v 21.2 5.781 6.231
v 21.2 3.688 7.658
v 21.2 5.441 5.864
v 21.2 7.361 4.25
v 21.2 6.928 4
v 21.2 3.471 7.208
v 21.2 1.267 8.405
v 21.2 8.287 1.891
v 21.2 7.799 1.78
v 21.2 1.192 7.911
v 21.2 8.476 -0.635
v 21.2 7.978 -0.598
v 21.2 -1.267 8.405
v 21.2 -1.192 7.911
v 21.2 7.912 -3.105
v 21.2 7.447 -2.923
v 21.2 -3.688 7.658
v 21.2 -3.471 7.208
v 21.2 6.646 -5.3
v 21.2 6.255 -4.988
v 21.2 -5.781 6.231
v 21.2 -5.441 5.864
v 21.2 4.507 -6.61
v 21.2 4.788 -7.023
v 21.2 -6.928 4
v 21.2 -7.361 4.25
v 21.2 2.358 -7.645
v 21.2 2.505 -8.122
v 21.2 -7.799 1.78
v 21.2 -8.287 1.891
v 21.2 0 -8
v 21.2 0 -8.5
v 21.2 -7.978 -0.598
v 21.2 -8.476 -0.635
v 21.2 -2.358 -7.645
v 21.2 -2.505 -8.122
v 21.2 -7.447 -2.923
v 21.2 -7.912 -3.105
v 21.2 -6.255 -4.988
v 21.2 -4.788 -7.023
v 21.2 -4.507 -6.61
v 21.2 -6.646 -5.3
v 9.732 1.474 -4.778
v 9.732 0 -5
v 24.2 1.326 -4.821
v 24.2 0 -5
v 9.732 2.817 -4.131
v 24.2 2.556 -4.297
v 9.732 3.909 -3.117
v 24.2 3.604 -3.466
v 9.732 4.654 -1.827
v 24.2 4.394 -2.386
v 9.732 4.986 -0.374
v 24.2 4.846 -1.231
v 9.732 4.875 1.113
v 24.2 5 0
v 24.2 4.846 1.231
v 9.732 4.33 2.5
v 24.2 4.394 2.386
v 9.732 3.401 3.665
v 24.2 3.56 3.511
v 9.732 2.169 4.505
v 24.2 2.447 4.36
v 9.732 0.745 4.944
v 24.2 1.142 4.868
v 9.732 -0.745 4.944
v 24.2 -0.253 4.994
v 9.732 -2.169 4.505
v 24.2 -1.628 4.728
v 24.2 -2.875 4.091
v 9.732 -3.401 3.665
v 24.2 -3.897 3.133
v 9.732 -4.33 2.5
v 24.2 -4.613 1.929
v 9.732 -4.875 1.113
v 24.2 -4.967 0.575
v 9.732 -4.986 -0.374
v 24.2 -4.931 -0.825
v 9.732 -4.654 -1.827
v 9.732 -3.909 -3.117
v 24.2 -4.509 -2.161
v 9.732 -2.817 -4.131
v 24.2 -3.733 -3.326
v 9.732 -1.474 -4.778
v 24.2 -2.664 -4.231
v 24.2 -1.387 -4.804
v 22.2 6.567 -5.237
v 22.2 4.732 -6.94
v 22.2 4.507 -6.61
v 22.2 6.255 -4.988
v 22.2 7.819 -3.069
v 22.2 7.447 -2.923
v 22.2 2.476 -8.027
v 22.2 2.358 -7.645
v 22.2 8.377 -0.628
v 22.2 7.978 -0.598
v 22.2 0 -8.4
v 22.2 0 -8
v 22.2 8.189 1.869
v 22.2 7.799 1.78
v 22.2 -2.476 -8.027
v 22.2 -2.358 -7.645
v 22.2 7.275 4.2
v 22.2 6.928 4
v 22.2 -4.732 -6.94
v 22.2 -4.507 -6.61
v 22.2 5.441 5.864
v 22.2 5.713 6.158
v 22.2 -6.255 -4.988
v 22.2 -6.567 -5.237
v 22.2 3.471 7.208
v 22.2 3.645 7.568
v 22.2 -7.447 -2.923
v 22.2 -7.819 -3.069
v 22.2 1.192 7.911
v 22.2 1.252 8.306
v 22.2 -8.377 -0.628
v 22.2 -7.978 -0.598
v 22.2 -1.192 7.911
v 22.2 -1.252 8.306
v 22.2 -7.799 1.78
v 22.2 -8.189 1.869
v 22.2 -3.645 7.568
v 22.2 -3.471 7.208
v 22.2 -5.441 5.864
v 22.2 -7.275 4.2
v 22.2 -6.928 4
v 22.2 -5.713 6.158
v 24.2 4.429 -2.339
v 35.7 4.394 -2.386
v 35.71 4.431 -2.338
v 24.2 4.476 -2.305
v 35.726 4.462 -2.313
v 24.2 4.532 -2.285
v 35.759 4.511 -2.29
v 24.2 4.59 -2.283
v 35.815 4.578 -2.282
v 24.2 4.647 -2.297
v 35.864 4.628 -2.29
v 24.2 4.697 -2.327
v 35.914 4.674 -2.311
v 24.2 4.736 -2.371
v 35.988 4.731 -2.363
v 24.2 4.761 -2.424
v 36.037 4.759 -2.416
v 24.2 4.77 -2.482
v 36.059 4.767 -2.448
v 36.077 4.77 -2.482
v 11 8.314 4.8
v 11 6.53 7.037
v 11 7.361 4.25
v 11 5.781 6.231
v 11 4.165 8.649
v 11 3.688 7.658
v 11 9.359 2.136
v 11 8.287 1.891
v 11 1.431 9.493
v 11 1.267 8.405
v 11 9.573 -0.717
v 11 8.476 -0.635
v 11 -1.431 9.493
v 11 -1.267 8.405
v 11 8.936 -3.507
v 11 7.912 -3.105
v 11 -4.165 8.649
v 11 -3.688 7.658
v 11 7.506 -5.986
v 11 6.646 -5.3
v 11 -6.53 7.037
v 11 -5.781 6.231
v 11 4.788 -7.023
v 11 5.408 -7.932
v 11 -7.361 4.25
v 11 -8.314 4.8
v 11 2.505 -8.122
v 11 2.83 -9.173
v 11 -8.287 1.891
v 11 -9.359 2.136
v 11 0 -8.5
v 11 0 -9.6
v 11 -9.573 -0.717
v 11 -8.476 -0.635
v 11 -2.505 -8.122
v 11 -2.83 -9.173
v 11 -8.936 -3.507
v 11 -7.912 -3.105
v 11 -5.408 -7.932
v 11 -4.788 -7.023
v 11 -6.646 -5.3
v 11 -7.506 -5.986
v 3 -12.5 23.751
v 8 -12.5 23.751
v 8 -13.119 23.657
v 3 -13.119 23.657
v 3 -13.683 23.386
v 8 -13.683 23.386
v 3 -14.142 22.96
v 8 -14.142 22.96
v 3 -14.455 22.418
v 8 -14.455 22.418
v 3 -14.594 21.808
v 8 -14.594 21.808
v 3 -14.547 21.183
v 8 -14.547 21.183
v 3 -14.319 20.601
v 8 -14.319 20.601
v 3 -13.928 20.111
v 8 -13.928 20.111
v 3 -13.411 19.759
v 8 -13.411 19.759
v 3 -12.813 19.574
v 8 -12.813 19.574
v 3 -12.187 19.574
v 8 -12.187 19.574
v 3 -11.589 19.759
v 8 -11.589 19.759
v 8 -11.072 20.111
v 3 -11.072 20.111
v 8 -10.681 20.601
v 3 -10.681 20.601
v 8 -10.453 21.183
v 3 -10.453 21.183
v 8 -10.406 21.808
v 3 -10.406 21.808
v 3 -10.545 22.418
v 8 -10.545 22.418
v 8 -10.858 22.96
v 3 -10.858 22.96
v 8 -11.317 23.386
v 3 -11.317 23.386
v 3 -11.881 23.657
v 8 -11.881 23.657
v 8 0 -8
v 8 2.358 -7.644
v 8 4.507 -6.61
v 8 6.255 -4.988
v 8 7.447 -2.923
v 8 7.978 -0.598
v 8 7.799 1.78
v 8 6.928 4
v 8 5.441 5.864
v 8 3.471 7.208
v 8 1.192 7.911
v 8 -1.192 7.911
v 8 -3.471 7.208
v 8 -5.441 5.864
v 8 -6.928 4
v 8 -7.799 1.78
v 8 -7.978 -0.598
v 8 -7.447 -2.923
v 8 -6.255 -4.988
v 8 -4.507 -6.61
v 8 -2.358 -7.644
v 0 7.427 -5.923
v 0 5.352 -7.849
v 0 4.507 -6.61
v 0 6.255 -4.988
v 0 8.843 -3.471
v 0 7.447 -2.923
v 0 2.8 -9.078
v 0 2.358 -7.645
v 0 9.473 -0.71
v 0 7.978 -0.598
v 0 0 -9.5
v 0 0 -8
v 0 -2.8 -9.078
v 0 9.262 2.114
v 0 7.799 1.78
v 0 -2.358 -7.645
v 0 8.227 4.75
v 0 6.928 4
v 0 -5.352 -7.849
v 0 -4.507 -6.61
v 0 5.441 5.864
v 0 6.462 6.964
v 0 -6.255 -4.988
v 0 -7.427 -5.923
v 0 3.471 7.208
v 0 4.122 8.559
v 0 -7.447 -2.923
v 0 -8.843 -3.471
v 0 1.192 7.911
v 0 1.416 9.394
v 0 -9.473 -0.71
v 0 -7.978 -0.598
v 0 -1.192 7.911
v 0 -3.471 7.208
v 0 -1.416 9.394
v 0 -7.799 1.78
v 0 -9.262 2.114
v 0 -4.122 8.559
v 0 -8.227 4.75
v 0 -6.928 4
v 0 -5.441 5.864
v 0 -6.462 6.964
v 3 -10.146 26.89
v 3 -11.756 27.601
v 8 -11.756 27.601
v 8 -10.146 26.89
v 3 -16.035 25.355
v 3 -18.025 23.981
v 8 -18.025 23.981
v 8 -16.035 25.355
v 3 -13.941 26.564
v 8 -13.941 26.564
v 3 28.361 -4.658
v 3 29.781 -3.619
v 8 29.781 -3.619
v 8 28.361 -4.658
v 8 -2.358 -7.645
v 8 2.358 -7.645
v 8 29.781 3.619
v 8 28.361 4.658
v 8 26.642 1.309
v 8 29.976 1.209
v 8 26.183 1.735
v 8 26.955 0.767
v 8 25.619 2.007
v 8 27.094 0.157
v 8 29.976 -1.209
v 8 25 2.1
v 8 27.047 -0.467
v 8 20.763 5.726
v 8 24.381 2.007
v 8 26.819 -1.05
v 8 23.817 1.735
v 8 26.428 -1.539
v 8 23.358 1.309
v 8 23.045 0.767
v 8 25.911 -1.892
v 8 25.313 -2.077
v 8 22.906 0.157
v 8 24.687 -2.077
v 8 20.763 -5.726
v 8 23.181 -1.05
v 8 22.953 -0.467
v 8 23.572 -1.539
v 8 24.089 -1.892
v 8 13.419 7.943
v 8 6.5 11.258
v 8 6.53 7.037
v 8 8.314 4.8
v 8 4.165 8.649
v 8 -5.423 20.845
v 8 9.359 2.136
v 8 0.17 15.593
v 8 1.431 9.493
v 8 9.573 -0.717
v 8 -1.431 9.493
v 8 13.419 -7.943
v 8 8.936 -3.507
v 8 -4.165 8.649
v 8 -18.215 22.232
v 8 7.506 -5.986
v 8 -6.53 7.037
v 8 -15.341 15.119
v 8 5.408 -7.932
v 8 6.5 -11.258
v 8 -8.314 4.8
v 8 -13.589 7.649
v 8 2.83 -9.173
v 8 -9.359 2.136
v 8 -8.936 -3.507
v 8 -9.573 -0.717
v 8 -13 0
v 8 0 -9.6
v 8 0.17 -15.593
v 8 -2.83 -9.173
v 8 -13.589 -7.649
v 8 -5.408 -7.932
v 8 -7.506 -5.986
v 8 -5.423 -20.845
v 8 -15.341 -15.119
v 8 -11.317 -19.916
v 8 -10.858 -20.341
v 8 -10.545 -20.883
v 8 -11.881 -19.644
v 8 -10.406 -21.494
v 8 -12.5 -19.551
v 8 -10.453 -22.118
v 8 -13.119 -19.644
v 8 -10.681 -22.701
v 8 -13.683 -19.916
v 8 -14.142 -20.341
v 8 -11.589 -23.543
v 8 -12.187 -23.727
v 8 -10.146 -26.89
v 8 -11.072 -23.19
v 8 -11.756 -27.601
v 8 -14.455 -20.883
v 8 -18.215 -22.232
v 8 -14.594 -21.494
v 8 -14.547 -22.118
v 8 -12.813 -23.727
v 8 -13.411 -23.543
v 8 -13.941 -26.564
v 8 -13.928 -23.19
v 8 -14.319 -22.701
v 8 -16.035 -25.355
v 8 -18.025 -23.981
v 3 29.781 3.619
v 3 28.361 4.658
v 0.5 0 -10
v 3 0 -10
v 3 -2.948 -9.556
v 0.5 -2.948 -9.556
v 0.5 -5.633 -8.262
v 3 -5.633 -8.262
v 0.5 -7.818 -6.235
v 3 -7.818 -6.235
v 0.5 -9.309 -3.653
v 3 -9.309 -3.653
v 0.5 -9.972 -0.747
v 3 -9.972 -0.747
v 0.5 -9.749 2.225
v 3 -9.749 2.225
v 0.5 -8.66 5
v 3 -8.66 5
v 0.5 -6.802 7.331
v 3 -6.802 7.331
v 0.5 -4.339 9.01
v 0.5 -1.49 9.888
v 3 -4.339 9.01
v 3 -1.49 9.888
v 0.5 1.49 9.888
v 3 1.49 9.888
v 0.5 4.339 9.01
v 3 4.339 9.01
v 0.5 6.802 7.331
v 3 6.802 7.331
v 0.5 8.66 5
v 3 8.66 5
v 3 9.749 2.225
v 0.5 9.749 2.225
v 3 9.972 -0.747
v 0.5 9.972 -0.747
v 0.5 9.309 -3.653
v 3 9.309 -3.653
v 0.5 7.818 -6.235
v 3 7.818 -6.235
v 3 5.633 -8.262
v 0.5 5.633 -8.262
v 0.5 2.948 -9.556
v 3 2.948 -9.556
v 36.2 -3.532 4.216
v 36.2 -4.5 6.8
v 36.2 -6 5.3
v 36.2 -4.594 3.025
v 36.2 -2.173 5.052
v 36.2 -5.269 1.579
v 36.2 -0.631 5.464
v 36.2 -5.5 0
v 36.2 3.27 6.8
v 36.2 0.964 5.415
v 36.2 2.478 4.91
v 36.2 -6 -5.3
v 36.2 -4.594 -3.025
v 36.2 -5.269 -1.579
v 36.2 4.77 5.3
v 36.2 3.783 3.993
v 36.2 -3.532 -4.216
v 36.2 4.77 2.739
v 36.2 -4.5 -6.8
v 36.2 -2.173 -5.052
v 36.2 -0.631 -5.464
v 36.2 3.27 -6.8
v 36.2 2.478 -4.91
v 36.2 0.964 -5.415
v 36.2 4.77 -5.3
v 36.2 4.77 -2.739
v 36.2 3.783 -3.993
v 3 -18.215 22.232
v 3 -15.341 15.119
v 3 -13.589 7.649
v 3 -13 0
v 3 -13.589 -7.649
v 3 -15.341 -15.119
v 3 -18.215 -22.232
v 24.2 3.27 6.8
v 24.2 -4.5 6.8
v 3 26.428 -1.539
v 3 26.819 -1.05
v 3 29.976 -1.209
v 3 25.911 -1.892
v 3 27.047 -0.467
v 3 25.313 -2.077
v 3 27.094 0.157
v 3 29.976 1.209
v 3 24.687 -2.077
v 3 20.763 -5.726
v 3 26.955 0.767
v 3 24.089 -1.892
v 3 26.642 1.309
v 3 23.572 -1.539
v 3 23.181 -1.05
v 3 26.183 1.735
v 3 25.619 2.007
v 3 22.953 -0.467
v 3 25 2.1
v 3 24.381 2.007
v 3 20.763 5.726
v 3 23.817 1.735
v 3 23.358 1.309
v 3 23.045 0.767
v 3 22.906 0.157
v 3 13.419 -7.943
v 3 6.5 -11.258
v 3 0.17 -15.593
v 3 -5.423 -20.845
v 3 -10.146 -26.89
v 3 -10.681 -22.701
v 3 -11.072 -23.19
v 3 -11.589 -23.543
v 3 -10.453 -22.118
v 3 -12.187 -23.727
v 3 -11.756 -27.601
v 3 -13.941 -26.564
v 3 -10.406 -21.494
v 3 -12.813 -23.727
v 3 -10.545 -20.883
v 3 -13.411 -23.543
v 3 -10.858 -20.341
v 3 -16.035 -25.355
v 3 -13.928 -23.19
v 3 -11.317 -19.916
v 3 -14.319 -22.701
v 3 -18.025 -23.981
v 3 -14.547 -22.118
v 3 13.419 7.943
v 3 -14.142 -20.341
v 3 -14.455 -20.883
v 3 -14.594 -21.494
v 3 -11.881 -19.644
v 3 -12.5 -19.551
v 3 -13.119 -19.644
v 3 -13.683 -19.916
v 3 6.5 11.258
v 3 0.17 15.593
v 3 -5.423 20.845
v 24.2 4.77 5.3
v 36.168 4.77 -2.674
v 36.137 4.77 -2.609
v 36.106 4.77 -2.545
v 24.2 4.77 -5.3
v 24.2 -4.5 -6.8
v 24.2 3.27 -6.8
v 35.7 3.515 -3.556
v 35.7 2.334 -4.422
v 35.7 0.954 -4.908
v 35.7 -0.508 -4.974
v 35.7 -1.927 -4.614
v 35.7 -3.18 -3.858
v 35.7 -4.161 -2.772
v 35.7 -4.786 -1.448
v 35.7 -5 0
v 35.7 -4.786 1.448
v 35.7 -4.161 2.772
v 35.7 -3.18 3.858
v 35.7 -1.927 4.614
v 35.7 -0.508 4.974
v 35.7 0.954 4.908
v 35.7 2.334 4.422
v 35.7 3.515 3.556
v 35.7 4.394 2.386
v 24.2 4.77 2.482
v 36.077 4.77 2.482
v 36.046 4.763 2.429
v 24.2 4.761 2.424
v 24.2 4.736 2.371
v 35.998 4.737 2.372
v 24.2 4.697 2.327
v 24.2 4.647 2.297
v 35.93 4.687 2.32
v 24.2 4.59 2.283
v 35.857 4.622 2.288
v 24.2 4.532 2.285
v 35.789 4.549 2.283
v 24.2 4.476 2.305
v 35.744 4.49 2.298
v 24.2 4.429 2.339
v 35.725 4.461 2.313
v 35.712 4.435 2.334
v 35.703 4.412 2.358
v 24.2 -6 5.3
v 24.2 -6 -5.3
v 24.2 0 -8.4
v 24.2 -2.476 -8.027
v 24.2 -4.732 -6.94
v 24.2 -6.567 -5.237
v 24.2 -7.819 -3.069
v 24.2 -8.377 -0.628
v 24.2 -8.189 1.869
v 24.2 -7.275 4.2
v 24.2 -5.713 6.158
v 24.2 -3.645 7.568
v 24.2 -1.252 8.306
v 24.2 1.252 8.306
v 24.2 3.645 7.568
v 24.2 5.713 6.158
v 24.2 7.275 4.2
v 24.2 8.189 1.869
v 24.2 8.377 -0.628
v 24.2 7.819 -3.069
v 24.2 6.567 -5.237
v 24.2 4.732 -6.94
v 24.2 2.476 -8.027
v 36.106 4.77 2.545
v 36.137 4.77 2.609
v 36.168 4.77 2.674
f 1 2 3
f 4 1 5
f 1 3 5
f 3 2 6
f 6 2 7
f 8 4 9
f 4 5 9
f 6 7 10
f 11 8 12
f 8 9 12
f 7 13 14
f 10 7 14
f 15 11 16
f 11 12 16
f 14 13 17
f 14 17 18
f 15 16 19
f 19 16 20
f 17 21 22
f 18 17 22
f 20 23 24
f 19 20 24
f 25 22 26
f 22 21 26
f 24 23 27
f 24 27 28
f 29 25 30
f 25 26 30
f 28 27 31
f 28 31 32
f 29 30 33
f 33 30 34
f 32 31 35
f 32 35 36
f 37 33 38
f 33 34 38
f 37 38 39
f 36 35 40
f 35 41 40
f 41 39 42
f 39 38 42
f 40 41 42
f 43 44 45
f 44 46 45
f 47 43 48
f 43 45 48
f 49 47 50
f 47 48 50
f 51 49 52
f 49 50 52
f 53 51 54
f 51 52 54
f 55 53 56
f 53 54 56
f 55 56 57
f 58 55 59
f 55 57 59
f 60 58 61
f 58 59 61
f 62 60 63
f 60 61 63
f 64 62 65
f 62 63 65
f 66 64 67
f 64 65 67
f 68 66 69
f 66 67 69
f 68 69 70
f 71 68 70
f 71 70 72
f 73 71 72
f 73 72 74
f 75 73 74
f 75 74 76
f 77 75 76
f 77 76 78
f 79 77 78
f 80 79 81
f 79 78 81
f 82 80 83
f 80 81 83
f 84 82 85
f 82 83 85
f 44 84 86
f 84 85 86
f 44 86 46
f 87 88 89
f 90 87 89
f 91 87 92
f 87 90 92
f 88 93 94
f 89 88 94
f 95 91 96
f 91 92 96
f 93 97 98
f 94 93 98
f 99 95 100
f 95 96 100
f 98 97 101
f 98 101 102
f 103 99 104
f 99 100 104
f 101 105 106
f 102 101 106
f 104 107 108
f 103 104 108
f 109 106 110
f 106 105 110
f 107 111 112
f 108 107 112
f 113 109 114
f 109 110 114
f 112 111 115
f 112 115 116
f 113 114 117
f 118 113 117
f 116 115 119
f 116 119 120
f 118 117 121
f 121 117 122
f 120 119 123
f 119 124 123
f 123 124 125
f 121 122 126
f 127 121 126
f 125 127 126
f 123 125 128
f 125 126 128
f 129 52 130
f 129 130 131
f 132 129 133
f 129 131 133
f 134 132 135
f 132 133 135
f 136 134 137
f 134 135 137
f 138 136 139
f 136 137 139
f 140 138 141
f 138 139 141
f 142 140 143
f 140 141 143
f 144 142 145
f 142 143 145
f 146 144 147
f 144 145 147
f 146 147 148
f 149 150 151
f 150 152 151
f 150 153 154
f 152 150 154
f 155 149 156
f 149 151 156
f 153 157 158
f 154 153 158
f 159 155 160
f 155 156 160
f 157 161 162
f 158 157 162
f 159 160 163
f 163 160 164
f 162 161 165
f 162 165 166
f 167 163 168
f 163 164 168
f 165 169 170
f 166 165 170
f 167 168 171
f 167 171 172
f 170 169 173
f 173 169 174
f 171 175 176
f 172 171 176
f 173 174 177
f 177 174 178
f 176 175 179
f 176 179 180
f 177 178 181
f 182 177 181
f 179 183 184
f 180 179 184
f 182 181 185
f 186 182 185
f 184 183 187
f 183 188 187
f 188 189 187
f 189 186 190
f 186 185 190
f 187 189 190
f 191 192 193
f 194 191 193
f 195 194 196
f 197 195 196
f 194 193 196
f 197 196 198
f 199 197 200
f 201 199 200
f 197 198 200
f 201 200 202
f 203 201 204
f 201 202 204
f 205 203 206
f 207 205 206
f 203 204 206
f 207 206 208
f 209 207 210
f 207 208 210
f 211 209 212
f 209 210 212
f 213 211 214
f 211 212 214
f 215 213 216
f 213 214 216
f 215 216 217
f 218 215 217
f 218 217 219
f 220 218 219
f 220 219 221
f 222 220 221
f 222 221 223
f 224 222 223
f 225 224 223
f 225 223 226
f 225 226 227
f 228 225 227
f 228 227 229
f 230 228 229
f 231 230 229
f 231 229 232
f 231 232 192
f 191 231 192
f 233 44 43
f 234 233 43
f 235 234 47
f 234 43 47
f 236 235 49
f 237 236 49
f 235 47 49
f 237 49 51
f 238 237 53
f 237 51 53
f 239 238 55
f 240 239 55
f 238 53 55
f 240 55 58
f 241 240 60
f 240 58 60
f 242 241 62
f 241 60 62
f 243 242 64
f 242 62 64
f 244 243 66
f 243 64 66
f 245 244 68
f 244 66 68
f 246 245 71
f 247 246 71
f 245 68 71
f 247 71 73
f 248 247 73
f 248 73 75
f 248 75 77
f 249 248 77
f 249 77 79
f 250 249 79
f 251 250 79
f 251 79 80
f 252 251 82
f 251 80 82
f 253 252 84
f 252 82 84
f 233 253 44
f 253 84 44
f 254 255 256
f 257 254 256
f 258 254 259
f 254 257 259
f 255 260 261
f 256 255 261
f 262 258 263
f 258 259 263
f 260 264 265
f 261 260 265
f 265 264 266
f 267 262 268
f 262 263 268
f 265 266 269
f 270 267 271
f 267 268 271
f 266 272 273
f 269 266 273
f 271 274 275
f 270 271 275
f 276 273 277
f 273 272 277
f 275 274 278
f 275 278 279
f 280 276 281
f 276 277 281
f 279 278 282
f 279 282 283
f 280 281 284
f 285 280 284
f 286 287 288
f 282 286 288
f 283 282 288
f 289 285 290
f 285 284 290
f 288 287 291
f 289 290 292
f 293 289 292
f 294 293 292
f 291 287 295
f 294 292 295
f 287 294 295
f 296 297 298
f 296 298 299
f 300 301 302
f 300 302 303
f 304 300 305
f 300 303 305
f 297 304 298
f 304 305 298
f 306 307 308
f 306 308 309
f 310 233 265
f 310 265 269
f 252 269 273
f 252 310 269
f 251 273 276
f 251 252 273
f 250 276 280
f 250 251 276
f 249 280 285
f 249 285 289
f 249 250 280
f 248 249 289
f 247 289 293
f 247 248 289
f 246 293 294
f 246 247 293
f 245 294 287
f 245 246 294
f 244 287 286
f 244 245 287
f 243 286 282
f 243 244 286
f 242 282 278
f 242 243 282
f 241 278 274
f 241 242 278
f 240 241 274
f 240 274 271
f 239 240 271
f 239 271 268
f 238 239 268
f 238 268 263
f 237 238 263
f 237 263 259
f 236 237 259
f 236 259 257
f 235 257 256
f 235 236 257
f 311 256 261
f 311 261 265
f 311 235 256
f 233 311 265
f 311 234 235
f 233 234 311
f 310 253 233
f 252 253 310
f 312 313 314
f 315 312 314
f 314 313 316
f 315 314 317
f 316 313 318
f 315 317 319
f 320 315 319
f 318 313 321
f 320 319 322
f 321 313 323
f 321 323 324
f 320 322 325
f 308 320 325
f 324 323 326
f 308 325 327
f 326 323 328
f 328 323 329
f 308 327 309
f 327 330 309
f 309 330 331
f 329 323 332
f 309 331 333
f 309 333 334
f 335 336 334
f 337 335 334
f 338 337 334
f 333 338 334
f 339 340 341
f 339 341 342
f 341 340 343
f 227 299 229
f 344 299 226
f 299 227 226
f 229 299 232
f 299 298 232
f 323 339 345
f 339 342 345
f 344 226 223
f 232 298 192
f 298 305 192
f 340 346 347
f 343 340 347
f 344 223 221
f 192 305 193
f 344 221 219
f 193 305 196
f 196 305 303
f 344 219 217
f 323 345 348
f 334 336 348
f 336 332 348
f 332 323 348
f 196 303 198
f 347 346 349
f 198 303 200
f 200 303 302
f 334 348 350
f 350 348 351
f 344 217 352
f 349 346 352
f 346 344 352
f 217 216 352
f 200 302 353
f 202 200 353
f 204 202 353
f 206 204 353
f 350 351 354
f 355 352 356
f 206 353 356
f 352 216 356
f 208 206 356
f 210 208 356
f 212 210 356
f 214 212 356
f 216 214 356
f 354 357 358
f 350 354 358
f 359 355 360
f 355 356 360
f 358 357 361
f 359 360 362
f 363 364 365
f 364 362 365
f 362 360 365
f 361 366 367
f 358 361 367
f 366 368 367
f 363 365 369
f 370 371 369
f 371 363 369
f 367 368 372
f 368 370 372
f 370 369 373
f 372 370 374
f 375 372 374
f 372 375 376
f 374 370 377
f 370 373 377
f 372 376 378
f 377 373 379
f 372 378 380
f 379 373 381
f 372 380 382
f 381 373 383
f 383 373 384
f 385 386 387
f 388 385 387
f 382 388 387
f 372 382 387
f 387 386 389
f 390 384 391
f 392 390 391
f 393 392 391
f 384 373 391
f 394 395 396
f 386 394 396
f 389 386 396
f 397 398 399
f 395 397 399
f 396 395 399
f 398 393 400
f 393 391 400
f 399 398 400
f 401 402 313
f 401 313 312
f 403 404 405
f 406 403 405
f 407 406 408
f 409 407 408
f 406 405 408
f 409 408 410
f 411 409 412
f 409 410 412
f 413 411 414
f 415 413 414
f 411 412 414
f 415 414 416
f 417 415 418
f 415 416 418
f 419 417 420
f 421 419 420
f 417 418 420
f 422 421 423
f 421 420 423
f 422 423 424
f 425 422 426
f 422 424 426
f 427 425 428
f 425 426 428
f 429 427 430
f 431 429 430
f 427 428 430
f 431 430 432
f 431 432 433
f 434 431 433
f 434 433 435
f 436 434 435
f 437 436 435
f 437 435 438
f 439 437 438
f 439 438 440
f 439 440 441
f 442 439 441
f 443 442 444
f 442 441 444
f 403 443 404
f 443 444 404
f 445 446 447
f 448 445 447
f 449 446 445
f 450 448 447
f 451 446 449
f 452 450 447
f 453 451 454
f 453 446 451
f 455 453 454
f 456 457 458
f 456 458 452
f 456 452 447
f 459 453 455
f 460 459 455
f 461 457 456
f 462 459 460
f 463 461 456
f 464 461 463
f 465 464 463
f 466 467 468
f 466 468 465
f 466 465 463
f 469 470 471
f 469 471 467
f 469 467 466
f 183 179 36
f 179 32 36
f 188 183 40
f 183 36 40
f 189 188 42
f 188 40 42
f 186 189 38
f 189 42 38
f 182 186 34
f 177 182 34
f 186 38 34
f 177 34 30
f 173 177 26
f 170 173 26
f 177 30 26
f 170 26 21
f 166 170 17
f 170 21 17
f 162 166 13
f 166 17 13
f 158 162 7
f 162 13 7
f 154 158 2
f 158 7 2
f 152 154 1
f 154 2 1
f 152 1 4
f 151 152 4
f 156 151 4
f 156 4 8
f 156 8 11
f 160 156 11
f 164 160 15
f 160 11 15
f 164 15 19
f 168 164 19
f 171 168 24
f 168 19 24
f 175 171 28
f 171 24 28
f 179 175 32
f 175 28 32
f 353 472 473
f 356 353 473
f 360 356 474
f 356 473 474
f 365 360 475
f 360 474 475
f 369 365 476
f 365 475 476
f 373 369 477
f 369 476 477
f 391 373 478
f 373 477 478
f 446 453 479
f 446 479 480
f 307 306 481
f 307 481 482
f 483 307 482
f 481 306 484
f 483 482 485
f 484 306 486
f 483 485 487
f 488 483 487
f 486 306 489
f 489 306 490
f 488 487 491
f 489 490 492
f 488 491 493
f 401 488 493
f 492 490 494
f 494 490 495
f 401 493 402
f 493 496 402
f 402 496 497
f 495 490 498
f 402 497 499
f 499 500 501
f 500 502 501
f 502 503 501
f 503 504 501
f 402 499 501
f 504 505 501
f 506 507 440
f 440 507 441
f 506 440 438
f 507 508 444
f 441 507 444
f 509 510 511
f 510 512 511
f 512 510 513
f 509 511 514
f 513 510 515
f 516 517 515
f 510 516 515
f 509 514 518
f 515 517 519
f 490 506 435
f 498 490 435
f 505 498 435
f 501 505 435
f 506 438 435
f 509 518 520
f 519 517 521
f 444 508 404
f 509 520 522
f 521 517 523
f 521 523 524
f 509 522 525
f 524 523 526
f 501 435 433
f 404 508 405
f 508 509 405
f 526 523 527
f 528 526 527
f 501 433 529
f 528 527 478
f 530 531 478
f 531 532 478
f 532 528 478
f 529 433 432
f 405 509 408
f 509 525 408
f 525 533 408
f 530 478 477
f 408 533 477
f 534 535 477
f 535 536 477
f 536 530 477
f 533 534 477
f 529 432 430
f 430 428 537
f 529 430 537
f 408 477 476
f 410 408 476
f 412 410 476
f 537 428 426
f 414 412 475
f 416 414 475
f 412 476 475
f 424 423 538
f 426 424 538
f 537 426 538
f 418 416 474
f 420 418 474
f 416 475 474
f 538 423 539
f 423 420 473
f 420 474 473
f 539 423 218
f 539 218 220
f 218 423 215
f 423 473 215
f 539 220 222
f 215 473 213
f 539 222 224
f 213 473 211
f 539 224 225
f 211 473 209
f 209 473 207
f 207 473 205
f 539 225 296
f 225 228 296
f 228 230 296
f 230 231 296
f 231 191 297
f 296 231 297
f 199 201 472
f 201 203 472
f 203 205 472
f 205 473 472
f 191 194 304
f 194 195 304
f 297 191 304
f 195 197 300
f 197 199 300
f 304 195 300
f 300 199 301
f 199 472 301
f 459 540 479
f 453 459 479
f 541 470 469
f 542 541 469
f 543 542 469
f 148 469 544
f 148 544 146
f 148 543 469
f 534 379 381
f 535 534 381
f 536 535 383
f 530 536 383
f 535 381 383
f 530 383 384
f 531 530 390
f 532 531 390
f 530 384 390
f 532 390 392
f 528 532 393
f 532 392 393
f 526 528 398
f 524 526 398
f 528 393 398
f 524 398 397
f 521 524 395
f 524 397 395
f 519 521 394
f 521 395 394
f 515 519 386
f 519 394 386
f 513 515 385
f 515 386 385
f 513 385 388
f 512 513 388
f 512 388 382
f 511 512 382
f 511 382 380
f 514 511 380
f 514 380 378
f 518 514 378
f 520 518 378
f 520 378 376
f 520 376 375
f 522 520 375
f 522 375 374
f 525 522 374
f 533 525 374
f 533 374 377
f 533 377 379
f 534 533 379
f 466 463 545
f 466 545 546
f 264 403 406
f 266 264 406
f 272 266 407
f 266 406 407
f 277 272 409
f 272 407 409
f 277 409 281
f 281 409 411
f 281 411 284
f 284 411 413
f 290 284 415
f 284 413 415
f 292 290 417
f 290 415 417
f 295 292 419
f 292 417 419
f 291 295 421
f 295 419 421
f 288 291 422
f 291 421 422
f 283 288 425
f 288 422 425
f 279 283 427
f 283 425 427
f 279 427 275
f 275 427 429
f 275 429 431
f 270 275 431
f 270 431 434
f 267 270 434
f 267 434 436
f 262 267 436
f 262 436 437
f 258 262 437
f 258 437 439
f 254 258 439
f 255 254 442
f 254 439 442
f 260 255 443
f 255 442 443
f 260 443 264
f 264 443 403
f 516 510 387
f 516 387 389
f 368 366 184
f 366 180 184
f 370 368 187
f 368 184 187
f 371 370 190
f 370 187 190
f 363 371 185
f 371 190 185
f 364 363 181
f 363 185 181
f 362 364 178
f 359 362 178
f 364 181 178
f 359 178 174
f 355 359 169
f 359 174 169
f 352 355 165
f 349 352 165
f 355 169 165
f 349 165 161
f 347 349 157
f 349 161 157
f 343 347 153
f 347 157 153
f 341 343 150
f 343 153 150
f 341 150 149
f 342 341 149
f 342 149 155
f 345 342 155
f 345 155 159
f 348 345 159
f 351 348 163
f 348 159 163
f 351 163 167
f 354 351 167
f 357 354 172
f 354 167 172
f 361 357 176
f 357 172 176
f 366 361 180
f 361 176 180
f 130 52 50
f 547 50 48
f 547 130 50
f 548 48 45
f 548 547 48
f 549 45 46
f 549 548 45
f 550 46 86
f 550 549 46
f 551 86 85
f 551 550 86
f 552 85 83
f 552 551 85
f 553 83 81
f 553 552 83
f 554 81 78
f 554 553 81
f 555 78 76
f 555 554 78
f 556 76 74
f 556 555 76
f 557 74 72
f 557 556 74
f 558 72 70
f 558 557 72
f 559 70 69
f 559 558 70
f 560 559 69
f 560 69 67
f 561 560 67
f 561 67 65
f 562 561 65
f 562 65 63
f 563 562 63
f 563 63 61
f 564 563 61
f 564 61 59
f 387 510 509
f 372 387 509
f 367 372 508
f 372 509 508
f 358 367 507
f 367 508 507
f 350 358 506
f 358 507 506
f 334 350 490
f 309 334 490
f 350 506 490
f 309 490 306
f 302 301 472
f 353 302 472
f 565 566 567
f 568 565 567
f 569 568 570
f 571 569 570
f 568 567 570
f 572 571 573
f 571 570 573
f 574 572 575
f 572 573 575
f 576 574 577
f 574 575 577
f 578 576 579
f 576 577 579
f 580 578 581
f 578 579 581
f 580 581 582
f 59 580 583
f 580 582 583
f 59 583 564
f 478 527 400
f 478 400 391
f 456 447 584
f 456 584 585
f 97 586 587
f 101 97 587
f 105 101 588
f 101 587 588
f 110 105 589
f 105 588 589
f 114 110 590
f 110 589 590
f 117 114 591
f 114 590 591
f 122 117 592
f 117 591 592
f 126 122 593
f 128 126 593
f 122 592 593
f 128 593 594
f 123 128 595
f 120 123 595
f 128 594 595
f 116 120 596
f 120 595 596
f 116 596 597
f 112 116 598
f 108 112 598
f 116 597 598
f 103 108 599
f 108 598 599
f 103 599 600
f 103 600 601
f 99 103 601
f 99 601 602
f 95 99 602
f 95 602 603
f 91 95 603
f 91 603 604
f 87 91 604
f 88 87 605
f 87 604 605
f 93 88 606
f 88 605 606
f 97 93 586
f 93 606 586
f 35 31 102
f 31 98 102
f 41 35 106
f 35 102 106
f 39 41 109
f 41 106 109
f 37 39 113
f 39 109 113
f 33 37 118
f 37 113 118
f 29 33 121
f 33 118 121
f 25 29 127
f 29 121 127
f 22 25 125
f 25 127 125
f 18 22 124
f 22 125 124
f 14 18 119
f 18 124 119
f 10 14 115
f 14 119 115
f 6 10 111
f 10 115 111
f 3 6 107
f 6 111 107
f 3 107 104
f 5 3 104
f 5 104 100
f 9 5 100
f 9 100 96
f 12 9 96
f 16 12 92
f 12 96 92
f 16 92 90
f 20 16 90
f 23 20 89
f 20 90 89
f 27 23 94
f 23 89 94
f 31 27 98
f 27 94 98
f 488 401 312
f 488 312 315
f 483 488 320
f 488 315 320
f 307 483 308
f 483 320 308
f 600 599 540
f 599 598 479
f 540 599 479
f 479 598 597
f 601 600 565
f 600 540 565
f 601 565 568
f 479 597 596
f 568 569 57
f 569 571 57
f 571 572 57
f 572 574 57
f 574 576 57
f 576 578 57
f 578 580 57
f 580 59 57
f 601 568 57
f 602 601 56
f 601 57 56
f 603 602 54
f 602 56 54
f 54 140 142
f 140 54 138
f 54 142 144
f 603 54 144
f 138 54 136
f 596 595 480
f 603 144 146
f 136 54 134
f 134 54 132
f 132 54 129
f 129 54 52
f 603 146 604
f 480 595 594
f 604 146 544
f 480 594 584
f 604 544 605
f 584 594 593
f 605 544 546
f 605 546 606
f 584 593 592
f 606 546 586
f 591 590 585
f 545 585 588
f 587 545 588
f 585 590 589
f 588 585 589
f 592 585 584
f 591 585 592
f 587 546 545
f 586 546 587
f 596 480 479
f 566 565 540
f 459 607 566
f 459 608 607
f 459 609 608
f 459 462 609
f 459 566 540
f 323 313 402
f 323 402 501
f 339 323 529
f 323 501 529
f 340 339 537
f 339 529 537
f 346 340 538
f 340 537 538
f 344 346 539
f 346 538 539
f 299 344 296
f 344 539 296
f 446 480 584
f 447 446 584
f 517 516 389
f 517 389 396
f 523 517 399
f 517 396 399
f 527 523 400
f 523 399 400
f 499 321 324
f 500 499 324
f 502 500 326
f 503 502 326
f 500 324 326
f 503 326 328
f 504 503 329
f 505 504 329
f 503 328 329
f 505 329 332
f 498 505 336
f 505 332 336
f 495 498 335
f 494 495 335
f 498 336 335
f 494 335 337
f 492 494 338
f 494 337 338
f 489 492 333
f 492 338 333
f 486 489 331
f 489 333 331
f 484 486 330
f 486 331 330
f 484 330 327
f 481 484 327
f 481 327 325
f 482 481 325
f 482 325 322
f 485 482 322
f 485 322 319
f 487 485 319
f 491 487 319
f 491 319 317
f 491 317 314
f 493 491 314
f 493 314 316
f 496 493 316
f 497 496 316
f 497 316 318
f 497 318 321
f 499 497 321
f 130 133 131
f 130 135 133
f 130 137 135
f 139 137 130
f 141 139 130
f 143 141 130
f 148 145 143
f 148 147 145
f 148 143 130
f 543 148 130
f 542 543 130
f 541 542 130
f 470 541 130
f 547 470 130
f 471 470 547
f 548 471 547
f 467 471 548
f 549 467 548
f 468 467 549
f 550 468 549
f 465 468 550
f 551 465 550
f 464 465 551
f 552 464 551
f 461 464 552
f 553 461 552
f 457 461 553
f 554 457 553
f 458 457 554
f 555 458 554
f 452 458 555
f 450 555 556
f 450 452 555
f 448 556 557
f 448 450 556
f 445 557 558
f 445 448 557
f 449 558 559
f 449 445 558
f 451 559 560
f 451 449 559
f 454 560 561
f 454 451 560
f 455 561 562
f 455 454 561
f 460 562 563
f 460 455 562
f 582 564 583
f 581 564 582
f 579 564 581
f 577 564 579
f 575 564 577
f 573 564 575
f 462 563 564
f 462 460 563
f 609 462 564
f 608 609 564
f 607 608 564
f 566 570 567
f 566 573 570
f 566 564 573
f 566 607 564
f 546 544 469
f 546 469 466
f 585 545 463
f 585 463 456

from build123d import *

# Parameters (mm, degrees)
SKETCH_2_R               = 5
CUT_EXTRUDE_1_DEPTH      = 49.84301383
CUT_EXTRUDE_START        = -8
SKETCH_3_R               = 8
CUT_EXTRUDE_2_DEPTH      = 8
CHAMFER_1_SIZE2          = 1.732050808
CHAMFER_1_SIZE           = 3
HOLE_WIZARD_M5_1_D       = 4.2
CUT_EXTRUDE_3_DEPTH      = 48.428261617
PATTERN_CIRCULAR_1_COUNT = 3
CHAMFER_4_SIZE           = 0.5
EXTRUDE_START            = 12
EXTRUDE_1_DEPTH          = 12
CHAMFER_5_SIZE           = 1.5
CHAMFER_6_SIZE           = 0.5
FILLET_1_R               = 0.2


# Some blends are built 0.0001 mm under size
with BuildPart() as part:
    # 草图1 → 旋转1 (revolve)
    with BuildSketch(Plane.XY, mode=Mode.PRIVATE) as revolve_1_sk:
        Polygon((0, 0), (0, 10), (3, 10), (3, 30), (8, 30), (8, 9.6), (11, 9.6), (11, 8.5), (21.2, 8.5), (21.2, 8), (22.2, 8), (22.2, 8.4), (24.2, 8.4), (24.2, 0), align=None)
    revolve(revolve_1_sk.sketch.rotate(Axis((24.2, 0, 0), (-1, 0, 0)), 90), axis=Axis((24.2, 0, 0), (-1, 0, 0)))

    # 草图2 → 切除-拉伸1 (cut, through all)
    with BuildSketch(Plane(origin=(24.2, 0, 0), x_dir=(0, 0, -1), z_dir=(1, 0, 0))):
        Circle(SKETCH_2_R)
    extrude(amount=-CUT_EXTRUDE_1_DEPTH, mode=Mode.SUBTRACT)

    # 草图3 → 切除-拉伸2 (cut)
    with BuildSketch(Plane.ZY.offset(CUT_EXTRUDE_START)):
        with Locations(Location((0, 0, 0), (0, 0, 180))):
            Circle(SKETCH_3_R)
    extrude(amount=CUT_EXTRUDE_2_DEPTH, mode=Mode.SUBTRACT)

    # 倒角1
    chamfer_1_edges = [part.edges().sort_by_distance(p)[0] for p in [
        (8, 0, 5),
    ]]
    chamfer_1_side = [part.faces().sort_by_distance(p)[0] for p in [
        (8, 0, 5.034641016),
    ]]
    chamfer(chamfer_1_edges, length=CHAMFER_1_SIZE - 0.0001, length2=CHAMFER_1_SIZE2 - 0.0001, reference=chamfer_1_side[0])  # a hair under: the kernel refuses the full size

    # M5 螺纹孔1 (through all)
    with Locations(Plane(origin=(3, 25, 0), x_dir=(0, 0, -1), z_dir=(-1, 0, 0))):
        with Locations((0, 0), (-21.650635095, 37.5), (21.650635095, 37.5)):
            Hole(HOLE_WIZARD_M5_1_D / 2)

    # 草图4 → 切除-拉伸3 (cut, through all)
    with BuildSketch(Plane.ZY.offset(-3)):
        with BuildLine():
            ThreePointArc((-27.710194429, -21.380952381), (0, -35), (27.710194429, -21.380952381))
            ThreePointArc((27.710194429, -21.380952381), (0, -13), (-27.710194429, -21.380952381))
        make_face()
    cut_extrude_3 = extrude(amount=-CUT_EXTRUDE_3_DEPTH, mode=Mode.SUBTRACT)

    # 阵列(圆周)1: 切除-拉伸3 ×3 about axis
    pattern_circular_1_axis = Axis((0, 0, 0), (1, 0, 0))
    for i in range(1, PATTERN_CIRCULAR_1_COUNT):
        add(cut_extrude_3.rotate(pattern_circular_1_axis, i * 360 / PATTERN_CIRCULAR_1_COUNT), mode=Mode.SUBTRACT)

    # 倒角2
    # the kernel refuses this chamfer: 1.262336382, 1 mm, written as the material it takes off along each edge
    with BuildSketch(Plane(origin=(-0.323534522, -18.801587302, -23.377346191), x_dir=(0, 0.7894182220381707, -0.6138557409637001), z_dir=(1, 0, 0)), Plane(origin=(-0.323534522, -10.844582024, 27.97132533), x_dir=(0, -0.9263237769525716, -0.3767283640135453), z_dir=(1, 0, 0)), Plane(origin=(-0.323534522, 29.646169325, -4.593979139), x_dir=(0, 0.13690555491440626, 0.9905841049772496), z_dir=(1, 0, 0))) as chamfer_2_piece_1:
        with BuildLine():
            Line((0.983994902, 0), (-0.239625676, 1.264429883))
            ThreePointArc((-0.239625676, 1.264429883), (-0.119678092, 0.653717986), (0, 0))
            ThreePointArc((0, 0), (0.509546154, -0.004029497), (0.983994902, 0))
        make_face()
    extrude(amount=11.647069044, mode=Mode.SUBTRACT)
    with BuildSketch(Plane(origin=(-0.323534522, -10.844582024, -27.97132533), x_dir=(0, 0.5426204152715339, 0.8399780264569711), z_dir=(1, 0, 0)), Plane(origin=(-0.323534522, 29.646169325, 4.593979139), x_dir=(0, -0.9987525171682211, 0.04993405100872917), z_dir=(1, 0, 0))) as chamfer_2_piece_2:
        with BuildLine():
            Line((1.28693566, 0), (-0.183218517, 0.966786917))
            ThreePointArc((-0.183218517, 0.966786917), (-0.098835833, 0.499884984), (0, 0))
            ThreePointArc((0, 0), (0.664569743, 0.004136227), (1.28693566, 0))
        make_face()
    extrude(amount=11.647069044, mode=Mode.SUBTRACT)
    with BuildSketch(Plane(origin=(-0.323534522, -18.801587302, 23.377346191), x_dir=(0, 0.7894182220381672, 0.6138557409637047), z_dir=(1, 0, 0))) as chamfer_2_piece_3:
        with BuildLine():
            Line((0.983994902, 0), (-0.239625676, -1.264429883))
            ThreePointArc((-0.239625676, -1.264429883), (-0.119678092, -0.653717986), (0, 0))
            ThreePointArc((0, 0), (0.509546154, 0.004029497), (0.983994902, 0))
        make_face()
    extrude(amount=11.647069044, mode=Mode.SUBTRACT)

    # 倒角4
    chamfer_4_edges = [part.edges().sort_by_distance(p)[0] for p in [
        (0, 0, 10),
    ]]
    chamfer(chamfer_4_edges, length=CHAMFER_4_SIZE)

    # 草图7 → 凸台-拉伸1 (add)
    with BuildSketch(Plane(origin=(24.2, 0, 0), x_dir=(0, 0, -1), z_dir=(1, 0, 0)).offset(EXTRUDE_START)):
        with BuildLine():
            Line((-6.8, -6), (6.8, -6))
            Line((6.8, -6), (6.8, 4.769696007))
            Line((6.8, 4.769696007), (1.5, 4.769696007))
            ThreePointArc((1.5, 4.769696007), (0, -5), (-1.5, 4.769696007))
            Line((-1.5, 4.769696007), (-6.8, 4.769696007))
            Line((-6.8, 4.769696007), (-6.8, -6))
        make_face()
    extrude(amount=-EXTRUDE_1_DEPTH)

    # 倒角5
    # the kernel refuses this chamfer: 1.5 mm, written as the material it takes off along each edge
    with BuildSketch(Plane(origin=(40.057524482, 4.769696007, 6.8), x_dir=(0, 0, -1), z_dir=(-1, 0, 0)), Plane(origin=(40.057524482, -6, 6.8), x_dir=(0, 1, 0), z_dir=(-1, 0, 0))) as chamfer_5_piece_1:
        Polygon((CHAMFER_5_SIZE, 0), (0, CHAMFER_5_SIZE), (0, 0), align=None)
    extrude(amount=15.857524482, mode=Mode.SUBTRACT)
    with BuildSketch(Plane(origin=(40.057524482, -6, -6.8), x_dir=(0, 1, 0), z_dir=(-1, 0, 0)), Plane(origin=(40.057524482, 4.769696007, -6.8), x_dir=(0, 0, 1), z_dir=(-1, 0, 0))) as chamfer_5_piece_2:
        Polygon((CHAMFER_5_SIZE, 0), (0, -CHAMFER_5_SIZE), (0, 0), align=None)
    extrude(amount=15.857524482, mode=Mode.SUBTRACT)

    # 倒角6
    chamfer_6_edges = [part.edges().sort_by_distance(p)[0] for p in [
        (36.2, -5, 0),
    ]]
    chamfer(chamfer_6_edges, length=CHAMFER_6_SIZE)

    # 圆角1
    # the kernel refuses this fillet: 0.2 mm, written as the material it takes off along each edge
    with BuildSketch(Plane(origin=(38.153768211, 4.769696007, 1.5), x_dir=(0, -0.3904189103265273, 0.9206373197190341), z_dir=(-1, 0, 0))) as fillet_1_piece_1:
        with BuildLine():
            CenterArc((0.981696018, 0.199071541), FILLET_1_R, 112.980567733, 151.496467657)
            Line((0.903612236, 0.383199004), (0, 0))
            ThreePointArc((0, 0), (0.481223538, 0.023211487), (0.962447076, 0))
        make_face()
    extrude(amount=13.953768211, mode=Mode.SUBTRACT)
    with BuildSketch(Plane(origin=(38.153768211, 4.769696007, -1.5), x_dir=(0, -0.39041891032652715, -0.9206373197190343), z_dir=(-1, 0, 0))) as fillet_1_piece_2:
        with BuildLine():
            CenterArc((0.981696018, -0.199071541), FILLET_1_R, 95.52296461, 151.496467657)
            Line((0.903612236, -0.383199004), (0, 0))
            ThreePointArc((0, 0), (0.481223538, -0.023211487), (0.962447076, 0))
        make_face()
    extrude(amount=13.953768211, mode=Mode.SUBTRACT)


solid = part.part
